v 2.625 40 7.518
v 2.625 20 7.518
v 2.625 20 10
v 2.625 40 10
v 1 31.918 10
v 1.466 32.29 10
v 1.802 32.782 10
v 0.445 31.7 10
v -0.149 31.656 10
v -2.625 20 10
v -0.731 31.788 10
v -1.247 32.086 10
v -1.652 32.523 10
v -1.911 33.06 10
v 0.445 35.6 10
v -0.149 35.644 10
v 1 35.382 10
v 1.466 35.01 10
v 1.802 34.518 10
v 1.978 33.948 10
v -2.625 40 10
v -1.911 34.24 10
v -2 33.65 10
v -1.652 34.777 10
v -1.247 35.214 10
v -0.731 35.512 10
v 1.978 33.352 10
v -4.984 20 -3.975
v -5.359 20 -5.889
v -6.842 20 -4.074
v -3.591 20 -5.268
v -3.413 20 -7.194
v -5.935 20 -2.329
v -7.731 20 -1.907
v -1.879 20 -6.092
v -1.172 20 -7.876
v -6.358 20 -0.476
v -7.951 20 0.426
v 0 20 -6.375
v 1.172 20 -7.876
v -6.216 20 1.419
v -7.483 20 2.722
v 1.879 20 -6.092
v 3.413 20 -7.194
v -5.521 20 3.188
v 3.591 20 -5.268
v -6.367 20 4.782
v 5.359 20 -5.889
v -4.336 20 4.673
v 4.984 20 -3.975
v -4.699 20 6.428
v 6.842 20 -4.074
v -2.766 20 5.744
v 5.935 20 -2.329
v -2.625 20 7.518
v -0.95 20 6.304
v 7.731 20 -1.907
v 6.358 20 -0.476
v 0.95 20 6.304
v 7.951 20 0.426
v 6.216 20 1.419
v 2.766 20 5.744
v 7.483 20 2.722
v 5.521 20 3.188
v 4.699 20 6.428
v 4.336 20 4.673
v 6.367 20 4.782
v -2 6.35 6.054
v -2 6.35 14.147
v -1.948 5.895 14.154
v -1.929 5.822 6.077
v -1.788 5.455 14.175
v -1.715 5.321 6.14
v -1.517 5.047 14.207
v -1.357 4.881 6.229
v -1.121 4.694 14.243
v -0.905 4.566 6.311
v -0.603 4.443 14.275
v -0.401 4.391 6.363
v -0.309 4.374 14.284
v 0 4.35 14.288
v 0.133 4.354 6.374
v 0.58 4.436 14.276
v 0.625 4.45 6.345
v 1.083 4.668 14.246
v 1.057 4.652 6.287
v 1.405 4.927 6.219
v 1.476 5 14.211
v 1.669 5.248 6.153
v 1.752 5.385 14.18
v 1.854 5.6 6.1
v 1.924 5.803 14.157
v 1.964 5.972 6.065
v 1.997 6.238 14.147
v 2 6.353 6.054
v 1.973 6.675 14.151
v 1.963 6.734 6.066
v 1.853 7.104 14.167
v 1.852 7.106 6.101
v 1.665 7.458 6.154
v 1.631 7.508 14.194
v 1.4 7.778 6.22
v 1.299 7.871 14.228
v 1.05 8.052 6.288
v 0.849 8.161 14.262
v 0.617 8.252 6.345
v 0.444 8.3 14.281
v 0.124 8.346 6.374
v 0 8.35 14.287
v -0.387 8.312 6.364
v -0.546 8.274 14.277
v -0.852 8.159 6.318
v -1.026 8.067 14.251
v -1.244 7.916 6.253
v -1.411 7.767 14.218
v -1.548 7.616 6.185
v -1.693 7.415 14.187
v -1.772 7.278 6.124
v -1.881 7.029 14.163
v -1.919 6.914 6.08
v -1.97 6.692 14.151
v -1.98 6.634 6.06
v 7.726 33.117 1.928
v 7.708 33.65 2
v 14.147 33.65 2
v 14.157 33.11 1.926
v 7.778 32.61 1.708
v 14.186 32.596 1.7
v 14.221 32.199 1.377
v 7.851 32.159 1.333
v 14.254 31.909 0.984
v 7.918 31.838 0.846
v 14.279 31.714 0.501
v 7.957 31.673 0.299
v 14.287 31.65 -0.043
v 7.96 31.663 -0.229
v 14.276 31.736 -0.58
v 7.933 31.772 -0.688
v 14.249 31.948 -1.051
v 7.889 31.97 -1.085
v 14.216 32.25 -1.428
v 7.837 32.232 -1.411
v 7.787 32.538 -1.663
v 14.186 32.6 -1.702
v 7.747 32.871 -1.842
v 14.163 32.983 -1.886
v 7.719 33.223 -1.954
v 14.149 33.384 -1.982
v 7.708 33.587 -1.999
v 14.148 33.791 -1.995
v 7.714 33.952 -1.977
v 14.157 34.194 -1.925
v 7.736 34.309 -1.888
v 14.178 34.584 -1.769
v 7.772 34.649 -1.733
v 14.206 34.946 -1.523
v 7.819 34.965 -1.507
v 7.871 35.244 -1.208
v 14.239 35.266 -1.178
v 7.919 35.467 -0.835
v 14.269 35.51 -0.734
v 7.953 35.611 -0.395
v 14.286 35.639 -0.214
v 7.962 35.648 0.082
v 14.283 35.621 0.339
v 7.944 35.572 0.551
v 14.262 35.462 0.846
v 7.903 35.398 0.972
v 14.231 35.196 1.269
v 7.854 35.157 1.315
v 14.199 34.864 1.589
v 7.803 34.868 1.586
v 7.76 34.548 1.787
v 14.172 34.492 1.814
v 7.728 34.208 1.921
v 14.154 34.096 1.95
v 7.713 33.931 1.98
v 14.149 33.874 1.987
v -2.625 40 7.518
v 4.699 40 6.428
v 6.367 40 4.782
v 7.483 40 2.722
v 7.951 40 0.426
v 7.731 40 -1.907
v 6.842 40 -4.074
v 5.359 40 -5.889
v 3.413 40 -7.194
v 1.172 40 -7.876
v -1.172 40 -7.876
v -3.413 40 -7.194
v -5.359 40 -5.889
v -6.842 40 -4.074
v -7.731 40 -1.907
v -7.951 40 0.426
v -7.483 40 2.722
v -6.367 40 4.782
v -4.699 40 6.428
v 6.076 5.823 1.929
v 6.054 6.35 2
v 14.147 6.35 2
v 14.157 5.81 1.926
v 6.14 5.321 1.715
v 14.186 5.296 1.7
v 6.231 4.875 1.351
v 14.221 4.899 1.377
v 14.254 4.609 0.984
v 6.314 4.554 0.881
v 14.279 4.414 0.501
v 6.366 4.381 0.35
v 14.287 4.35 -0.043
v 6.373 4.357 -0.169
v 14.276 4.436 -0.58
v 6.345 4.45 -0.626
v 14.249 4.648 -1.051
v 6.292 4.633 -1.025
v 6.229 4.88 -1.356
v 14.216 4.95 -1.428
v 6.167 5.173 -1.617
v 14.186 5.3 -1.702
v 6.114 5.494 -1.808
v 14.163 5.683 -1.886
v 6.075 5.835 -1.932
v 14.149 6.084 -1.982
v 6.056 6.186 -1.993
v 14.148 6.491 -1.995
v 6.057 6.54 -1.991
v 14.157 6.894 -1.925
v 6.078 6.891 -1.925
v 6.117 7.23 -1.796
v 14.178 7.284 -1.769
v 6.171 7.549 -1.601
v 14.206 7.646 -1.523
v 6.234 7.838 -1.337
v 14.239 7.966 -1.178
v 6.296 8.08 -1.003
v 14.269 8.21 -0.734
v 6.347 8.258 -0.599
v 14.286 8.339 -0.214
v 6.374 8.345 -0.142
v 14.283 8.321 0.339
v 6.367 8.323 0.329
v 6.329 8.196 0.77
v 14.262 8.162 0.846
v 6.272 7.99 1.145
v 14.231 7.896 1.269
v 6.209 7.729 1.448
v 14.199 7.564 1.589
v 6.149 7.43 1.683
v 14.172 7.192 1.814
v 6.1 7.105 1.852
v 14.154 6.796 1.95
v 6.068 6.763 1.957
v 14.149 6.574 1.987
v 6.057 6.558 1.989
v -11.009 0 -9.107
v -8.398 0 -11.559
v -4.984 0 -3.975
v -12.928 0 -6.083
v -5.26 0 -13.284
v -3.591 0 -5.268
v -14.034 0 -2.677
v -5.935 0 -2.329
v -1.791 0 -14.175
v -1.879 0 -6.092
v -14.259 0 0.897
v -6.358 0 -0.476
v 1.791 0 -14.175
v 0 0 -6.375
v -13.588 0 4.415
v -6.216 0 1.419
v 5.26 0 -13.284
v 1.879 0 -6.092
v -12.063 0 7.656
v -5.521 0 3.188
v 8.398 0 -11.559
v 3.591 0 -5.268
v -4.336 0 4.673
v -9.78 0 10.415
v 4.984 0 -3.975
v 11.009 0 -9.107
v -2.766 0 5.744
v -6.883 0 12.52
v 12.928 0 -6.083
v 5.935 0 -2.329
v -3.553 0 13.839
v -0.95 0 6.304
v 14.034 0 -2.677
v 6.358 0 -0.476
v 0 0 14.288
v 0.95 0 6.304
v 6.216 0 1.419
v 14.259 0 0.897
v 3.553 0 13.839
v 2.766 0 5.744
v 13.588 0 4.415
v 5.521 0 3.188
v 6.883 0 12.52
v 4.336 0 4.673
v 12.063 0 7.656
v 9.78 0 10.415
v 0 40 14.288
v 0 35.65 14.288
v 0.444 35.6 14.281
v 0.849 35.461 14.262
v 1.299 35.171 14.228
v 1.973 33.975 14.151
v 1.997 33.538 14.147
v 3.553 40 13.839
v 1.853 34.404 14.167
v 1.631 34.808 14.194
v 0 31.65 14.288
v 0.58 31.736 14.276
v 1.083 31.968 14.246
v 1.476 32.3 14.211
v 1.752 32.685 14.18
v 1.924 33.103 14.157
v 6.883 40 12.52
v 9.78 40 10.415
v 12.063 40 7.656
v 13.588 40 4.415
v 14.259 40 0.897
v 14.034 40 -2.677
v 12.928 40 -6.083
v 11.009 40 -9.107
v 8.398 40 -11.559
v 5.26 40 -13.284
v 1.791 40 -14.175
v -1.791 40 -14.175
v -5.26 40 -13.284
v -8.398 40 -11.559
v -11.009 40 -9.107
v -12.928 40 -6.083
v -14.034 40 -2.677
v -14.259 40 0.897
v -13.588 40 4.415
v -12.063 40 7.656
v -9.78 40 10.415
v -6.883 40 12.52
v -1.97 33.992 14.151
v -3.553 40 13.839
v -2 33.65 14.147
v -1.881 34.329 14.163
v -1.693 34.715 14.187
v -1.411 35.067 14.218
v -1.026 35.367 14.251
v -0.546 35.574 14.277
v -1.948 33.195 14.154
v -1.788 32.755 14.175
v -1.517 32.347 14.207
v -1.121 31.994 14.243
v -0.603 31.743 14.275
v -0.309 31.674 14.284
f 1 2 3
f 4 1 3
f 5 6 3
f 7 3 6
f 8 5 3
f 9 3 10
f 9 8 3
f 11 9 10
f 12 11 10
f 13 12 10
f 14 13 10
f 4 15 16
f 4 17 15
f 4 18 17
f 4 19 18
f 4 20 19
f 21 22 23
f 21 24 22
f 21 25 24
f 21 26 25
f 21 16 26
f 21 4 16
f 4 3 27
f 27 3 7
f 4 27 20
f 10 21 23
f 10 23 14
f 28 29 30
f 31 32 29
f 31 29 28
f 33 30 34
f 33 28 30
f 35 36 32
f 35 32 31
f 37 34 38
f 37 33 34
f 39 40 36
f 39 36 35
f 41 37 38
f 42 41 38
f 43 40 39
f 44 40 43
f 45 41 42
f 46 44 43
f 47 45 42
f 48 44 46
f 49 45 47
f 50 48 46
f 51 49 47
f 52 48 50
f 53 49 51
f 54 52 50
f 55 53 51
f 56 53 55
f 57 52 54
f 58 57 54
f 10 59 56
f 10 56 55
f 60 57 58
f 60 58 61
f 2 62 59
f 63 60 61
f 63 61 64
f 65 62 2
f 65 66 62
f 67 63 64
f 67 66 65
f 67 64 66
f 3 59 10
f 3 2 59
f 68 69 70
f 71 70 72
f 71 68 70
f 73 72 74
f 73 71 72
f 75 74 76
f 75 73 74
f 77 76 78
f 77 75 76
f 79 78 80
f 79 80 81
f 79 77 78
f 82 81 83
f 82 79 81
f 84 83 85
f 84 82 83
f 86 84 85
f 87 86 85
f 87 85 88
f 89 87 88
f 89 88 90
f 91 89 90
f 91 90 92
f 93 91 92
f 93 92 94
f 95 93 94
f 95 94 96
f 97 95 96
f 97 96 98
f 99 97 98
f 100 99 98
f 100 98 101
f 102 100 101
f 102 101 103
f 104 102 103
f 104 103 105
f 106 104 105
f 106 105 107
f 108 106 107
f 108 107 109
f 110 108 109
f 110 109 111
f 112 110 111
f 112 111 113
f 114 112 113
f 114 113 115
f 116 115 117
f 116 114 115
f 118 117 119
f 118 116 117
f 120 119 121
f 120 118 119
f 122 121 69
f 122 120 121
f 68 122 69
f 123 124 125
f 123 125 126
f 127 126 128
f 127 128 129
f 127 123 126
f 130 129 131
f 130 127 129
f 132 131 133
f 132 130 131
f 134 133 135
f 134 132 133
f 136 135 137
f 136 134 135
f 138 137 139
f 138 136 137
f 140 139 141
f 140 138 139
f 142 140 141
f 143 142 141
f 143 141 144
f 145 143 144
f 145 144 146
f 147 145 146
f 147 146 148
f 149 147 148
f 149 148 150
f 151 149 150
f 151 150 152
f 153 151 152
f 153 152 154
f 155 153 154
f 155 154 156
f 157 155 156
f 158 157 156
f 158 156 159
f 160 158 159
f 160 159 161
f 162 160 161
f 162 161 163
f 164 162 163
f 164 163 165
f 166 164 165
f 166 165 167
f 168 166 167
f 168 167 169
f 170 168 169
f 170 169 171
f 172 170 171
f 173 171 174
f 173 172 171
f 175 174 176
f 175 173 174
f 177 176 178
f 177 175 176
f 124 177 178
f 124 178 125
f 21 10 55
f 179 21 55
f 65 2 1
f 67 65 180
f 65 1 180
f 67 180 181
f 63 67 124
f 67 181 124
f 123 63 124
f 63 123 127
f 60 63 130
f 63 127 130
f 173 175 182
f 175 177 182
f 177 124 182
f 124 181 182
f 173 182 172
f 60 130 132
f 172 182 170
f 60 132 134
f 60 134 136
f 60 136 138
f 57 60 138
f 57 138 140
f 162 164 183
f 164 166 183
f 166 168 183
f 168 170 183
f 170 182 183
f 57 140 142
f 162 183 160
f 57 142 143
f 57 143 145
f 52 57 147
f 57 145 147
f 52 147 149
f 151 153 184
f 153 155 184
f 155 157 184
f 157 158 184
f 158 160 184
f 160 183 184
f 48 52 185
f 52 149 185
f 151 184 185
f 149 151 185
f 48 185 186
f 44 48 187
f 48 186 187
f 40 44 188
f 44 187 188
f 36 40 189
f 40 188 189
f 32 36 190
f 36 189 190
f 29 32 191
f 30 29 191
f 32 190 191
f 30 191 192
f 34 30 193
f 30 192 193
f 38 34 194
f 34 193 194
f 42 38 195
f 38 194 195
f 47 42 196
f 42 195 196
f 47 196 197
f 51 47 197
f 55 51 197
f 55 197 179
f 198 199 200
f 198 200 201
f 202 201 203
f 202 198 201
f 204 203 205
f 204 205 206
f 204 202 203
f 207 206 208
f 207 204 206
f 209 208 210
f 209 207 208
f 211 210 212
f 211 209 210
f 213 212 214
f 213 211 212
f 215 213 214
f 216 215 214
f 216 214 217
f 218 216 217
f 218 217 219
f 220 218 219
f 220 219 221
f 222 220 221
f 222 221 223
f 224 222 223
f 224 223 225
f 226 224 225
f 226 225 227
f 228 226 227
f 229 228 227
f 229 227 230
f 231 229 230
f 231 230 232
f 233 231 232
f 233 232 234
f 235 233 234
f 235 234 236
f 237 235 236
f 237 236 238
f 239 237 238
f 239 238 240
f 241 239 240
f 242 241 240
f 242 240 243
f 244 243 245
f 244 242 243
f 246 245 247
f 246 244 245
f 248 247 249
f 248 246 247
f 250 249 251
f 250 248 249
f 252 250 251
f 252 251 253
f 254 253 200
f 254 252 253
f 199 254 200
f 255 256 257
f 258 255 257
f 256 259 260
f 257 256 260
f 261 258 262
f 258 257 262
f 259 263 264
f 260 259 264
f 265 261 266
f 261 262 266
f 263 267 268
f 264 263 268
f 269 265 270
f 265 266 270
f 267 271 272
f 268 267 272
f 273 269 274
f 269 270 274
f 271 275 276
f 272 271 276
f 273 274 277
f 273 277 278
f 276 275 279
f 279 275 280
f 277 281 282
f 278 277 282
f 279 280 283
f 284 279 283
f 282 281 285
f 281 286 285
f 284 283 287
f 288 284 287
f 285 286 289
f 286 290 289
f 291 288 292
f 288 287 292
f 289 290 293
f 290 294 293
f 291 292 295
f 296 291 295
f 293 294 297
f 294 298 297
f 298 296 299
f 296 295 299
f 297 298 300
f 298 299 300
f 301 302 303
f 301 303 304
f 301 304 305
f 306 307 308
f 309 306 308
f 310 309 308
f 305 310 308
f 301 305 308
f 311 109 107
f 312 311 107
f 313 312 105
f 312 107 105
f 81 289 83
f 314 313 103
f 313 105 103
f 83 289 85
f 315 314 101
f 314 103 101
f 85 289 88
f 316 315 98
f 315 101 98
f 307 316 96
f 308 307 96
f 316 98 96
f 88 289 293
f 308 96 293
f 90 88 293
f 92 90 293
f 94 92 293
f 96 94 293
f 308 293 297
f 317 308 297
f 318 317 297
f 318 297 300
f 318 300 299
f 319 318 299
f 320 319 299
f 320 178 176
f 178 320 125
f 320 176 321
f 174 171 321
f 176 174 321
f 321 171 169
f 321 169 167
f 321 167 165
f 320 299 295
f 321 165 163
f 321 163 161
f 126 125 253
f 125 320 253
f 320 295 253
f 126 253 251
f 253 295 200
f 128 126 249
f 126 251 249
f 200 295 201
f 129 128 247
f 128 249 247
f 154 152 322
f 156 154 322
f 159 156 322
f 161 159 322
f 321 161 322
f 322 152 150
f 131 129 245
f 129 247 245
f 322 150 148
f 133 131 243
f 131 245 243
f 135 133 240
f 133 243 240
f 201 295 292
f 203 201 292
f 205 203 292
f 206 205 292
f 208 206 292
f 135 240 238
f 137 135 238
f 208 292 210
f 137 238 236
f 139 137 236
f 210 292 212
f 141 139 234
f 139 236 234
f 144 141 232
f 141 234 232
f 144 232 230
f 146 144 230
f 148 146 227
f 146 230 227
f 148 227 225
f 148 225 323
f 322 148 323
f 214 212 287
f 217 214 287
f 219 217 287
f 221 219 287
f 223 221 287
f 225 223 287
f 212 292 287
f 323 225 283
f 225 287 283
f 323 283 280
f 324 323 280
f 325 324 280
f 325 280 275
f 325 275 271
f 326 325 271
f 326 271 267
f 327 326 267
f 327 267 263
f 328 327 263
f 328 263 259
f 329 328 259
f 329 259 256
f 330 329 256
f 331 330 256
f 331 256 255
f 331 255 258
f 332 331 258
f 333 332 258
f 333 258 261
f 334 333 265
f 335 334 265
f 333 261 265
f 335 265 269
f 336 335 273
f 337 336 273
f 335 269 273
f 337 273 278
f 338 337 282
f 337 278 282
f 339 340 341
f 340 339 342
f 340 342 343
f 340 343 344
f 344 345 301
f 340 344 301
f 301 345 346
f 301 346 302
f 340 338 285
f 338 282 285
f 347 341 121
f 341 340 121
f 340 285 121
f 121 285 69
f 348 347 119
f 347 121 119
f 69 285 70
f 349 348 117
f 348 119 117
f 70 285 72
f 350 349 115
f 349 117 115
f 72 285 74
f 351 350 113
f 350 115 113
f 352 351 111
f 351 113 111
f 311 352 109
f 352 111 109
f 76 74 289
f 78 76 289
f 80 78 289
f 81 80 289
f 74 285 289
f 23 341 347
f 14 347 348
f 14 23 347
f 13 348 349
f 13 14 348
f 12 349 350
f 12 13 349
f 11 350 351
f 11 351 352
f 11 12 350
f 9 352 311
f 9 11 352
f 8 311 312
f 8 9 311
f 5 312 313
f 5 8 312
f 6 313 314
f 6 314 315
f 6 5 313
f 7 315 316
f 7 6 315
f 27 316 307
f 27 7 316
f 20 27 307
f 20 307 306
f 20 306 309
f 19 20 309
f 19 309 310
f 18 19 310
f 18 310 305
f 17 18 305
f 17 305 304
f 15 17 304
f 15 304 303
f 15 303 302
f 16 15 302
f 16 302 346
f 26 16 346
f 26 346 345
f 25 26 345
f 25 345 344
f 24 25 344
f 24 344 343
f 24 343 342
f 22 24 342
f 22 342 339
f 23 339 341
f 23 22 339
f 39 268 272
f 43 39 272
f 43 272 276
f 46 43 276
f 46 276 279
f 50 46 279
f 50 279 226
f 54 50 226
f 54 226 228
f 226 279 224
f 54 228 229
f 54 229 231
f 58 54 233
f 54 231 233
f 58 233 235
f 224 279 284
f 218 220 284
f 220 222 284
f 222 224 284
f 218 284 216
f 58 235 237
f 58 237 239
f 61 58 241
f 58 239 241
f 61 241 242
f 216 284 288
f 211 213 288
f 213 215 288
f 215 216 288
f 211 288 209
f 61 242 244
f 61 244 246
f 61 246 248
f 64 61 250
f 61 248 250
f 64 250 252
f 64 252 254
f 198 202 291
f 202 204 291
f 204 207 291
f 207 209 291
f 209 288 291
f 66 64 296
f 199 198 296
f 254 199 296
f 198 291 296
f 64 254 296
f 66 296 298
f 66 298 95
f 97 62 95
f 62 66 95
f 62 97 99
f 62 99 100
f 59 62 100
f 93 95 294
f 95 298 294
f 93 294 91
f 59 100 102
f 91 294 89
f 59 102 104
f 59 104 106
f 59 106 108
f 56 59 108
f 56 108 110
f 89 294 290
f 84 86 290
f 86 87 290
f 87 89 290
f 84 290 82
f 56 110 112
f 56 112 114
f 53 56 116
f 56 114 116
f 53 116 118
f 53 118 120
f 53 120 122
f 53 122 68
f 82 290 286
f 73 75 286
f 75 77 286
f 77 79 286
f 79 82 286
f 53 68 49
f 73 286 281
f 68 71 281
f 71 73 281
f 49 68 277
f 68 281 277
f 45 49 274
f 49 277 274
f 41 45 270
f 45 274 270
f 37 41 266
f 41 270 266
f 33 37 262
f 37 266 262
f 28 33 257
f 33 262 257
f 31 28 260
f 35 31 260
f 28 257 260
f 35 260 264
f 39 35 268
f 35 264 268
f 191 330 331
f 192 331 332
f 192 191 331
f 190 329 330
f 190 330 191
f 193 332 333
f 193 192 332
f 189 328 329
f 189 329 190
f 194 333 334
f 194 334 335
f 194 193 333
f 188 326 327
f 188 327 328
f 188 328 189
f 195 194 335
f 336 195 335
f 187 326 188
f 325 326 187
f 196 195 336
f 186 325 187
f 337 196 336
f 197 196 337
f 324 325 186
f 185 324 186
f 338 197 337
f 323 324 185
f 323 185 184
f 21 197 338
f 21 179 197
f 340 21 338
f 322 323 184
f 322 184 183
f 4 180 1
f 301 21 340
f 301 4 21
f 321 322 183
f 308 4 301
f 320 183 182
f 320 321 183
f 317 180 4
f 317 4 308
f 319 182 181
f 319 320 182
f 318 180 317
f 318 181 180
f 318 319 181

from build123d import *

# Parameters (mm, degrees)
SKETCH1_R               = 14.2875
BOSS_EXTRUDE1_DEPTH     = 40
CUT_EXTRUDE1_REACH      = 46.814
SKETCH2_R               = 6.3754
SKETCH3_R               = 7.9629
CUT_EXTRUDE2_DEPTH      = 20
CUT_EXTRUDE3_DEPTH      = 20
CUT_EXTRUDE4_REACH      = 46.814
CUT_EXTRUDE4_END_RADIUS = 14.2875
SKETCH5_R               = 2
CIRPATTERN1_COUNT       = 2
CIRPATTERN1_ANGLE       = 90


with BuildPart() as part:
    # Sketch1 → Boss-Extrude1 (new body)
    with BuildSketch(Plane(origin=(0, 0, 0), x_dir=(1, 0, 0), z_dir=(0, 1, 0))):
        with Locations(Location((0, 0, 0), (0, 0, 270))):
            Circle(SKETCH1_R)
    extrude(amount=BOSS_EXTRUDE1_DEPTH)

    # Sketch2 → Cut-Extrude1 (cut, up to next)
    with BuildSketch(Plane(origin=(0, 0, 0), x_dir=(-1, 0, 0), z_dir=(0, -1, 0)), mode=Mode.PRIVATE) as cut_extrude1_sk1:
        with Locations(Location((0, 0, 0), (0, 0, 90))):
            Circle(SKETCH2_R)
    cut_extrude1_tool1 = extrude(cut_extrude1_sk1.sketch, amount=-CUT_EXTRUDE1_REACH, mode=Mode.PRIVATE) & part.part
    add(cut_extrude1_tool1.solids().sort_by_distance((0, 0, 0))[0], mode=Mode.SUBTRACT)

    # Sketch3 → Cut-Extrude2 (cut)
    with BuildSketch(Plane(origin=(0, 40, 0), x_dir=(1, 0, 0), z_dir=(0, 1, 0))):
        with Locations(Location((0, 0, 0), (0, 0, 270))):
            Circle(SKETCH3_R)
    extrude(amount=-CUT_EXTRUDE2_DEPTH, mode=Mode.SUBTRACT)

    # Sketch4 → Cut-Extrude3 (cut)
    with BuildSketch(Plane(origin=(0, 40, 0), x_dir=(1, 0, 0), z_dir=(0, 1, 0))):
        with BuildLine():
            Line((2.625, -10), (-2.625, -10))
            Line((-2.625, -10), (-2.625, -7.517788997))
            ThreePointArc((-2.625, -7.517788997), (0, -7.9629), (2.625, -7.517788997))
            Line((2.625, -7.517788997), (2.625, -10))
        make_face()
    extrude(amount=-CUT_EXTRUDE3_DEPTH, mode=Mode.SUBTRACT)

    # Cut-Extrude4: up to this cylinder (the profile starts inside it)
    cut_extrude4_end = Plane(origin=(0, 20, 0), z_dir=(0, -1, 0)) * Cylinder(CUT_EXTRUDE4_END_RADIUS, 150.503, mode=Mode.PRIVATE)
    # Sketch5 → Cut-Extrude4 (cut, up to the surface)
    with BuildSketch(Plane.XY, mode=Mode.PRIVATE) as cut_extrude4_sk1:
        with Locations(Location((0, 33.65, 0), (0, 0, 180))):
            Circle(SKETCH5_R)
    cut_extrude4_tool1 = extrude(cut_extrude4_sk1.sketch, amount=CUT_EXTRUDE4_REACH, mode=Mode.PRIVATE) & cut_extrude4_end
    # Sketch5 → Cut-Extrude4 (cut, up to the surface)
    with BuildSketch(Plane.XY, mode=Mode.PRIVATE) as cut_extrude4_sk2:
        with Locations(Location((0, 6.35, 0), (0, 0, 180))):
            Circle(SKETCH5_R)
    cut_extrude4_tool2 = extrude(cut_extrude4_sk2.sketch, amount=CUT_EXTRUDE4_REACH, mode=Mode.PRIVATE) & cut_extrude4_end
    cut_extrude4 = cut_extrude4_tool1.solids().sort_by_distance((0, 33.65, 0))[0] + cut_extrude4_tool2.solids().sort_by_distance((0, 6.35, 0))[0]
    add(cut_extrude4, mode=Mode.SUBTRACT)

    # CirPattern1: Cut-Extrude4 ×2 about axis
    cirpattern1_axis = Axis((0, 40, 0), (0, 1, 0))
    for i in range(1, CIRPATTERN1_COUNT):
        add(cut_extrude4.rotate(cirpattern1_axis, i * CIRPATTERN1_ANGLE / (CIRPATTERN1_COUNT - 1)), mode=Mode.SUBTRACT)


solid = part.part
